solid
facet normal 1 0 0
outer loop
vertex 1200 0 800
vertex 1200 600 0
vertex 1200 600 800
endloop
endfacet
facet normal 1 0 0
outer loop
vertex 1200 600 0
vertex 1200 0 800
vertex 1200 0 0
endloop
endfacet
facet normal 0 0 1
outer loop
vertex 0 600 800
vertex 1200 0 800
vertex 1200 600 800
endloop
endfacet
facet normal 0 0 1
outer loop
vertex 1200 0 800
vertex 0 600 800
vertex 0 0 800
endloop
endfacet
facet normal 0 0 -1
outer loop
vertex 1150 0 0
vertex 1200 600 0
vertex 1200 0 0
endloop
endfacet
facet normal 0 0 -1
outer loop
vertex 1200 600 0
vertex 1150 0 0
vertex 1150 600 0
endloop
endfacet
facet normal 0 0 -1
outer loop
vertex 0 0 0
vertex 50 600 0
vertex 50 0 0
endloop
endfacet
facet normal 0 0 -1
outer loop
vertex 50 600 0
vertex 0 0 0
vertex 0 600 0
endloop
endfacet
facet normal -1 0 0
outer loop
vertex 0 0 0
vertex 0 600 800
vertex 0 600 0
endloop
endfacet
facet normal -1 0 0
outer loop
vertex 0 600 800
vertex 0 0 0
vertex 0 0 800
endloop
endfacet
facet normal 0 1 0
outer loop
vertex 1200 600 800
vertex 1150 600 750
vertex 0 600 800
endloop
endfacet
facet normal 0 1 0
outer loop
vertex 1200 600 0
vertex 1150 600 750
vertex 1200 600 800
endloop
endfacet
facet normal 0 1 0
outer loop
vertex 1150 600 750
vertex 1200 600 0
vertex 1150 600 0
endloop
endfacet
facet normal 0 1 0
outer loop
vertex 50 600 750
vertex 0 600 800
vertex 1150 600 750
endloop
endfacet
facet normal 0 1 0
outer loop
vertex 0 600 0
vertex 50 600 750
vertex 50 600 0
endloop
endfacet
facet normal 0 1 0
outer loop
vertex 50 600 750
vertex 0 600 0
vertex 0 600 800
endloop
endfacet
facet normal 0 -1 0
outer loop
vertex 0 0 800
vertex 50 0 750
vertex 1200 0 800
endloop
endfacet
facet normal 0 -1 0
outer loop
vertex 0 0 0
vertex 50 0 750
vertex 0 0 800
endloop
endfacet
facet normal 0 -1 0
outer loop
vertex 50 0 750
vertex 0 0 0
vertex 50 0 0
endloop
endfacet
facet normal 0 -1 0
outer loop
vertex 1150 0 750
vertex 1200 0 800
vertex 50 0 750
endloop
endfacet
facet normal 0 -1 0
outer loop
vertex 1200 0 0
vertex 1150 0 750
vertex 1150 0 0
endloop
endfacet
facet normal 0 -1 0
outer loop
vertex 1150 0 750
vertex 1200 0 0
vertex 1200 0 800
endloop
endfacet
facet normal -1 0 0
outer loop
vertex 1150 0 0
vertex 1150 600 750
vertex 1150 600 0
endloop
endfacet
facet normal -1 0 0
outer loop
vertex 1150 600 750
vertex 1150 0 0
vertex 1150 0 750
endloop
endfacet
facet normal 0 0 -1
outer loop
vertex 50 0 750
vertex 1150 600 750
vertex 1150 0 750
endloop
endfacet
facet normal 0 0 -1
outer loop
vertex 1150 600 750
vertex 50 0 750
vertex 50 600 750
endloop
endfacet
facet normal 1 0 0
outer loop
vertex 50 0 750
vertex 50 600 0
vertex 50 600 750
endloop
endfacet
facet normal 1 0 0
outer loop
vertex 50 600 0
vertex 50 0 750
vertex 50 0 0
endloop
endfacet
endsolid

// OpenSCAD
// table module

table_height    = 800;
table_width     = 1200;
table_length    = 600;
table_leg_width = 50;

// example rendering with above values
table(table_height,table_width,table_length,table_leg_width);


module table(height,
             width,
             length,
             leg_width)
{
    cutout_width    = width - 2*leg_width;
    cutout_height   = height - leg_width;
    
    difference(){
        // main frame
        cube([width, length, height]);
        
        // leg cutout
        translate([leg_width,0,0])
            cube([cutout_width, length, cutout_height]);
    }
}
